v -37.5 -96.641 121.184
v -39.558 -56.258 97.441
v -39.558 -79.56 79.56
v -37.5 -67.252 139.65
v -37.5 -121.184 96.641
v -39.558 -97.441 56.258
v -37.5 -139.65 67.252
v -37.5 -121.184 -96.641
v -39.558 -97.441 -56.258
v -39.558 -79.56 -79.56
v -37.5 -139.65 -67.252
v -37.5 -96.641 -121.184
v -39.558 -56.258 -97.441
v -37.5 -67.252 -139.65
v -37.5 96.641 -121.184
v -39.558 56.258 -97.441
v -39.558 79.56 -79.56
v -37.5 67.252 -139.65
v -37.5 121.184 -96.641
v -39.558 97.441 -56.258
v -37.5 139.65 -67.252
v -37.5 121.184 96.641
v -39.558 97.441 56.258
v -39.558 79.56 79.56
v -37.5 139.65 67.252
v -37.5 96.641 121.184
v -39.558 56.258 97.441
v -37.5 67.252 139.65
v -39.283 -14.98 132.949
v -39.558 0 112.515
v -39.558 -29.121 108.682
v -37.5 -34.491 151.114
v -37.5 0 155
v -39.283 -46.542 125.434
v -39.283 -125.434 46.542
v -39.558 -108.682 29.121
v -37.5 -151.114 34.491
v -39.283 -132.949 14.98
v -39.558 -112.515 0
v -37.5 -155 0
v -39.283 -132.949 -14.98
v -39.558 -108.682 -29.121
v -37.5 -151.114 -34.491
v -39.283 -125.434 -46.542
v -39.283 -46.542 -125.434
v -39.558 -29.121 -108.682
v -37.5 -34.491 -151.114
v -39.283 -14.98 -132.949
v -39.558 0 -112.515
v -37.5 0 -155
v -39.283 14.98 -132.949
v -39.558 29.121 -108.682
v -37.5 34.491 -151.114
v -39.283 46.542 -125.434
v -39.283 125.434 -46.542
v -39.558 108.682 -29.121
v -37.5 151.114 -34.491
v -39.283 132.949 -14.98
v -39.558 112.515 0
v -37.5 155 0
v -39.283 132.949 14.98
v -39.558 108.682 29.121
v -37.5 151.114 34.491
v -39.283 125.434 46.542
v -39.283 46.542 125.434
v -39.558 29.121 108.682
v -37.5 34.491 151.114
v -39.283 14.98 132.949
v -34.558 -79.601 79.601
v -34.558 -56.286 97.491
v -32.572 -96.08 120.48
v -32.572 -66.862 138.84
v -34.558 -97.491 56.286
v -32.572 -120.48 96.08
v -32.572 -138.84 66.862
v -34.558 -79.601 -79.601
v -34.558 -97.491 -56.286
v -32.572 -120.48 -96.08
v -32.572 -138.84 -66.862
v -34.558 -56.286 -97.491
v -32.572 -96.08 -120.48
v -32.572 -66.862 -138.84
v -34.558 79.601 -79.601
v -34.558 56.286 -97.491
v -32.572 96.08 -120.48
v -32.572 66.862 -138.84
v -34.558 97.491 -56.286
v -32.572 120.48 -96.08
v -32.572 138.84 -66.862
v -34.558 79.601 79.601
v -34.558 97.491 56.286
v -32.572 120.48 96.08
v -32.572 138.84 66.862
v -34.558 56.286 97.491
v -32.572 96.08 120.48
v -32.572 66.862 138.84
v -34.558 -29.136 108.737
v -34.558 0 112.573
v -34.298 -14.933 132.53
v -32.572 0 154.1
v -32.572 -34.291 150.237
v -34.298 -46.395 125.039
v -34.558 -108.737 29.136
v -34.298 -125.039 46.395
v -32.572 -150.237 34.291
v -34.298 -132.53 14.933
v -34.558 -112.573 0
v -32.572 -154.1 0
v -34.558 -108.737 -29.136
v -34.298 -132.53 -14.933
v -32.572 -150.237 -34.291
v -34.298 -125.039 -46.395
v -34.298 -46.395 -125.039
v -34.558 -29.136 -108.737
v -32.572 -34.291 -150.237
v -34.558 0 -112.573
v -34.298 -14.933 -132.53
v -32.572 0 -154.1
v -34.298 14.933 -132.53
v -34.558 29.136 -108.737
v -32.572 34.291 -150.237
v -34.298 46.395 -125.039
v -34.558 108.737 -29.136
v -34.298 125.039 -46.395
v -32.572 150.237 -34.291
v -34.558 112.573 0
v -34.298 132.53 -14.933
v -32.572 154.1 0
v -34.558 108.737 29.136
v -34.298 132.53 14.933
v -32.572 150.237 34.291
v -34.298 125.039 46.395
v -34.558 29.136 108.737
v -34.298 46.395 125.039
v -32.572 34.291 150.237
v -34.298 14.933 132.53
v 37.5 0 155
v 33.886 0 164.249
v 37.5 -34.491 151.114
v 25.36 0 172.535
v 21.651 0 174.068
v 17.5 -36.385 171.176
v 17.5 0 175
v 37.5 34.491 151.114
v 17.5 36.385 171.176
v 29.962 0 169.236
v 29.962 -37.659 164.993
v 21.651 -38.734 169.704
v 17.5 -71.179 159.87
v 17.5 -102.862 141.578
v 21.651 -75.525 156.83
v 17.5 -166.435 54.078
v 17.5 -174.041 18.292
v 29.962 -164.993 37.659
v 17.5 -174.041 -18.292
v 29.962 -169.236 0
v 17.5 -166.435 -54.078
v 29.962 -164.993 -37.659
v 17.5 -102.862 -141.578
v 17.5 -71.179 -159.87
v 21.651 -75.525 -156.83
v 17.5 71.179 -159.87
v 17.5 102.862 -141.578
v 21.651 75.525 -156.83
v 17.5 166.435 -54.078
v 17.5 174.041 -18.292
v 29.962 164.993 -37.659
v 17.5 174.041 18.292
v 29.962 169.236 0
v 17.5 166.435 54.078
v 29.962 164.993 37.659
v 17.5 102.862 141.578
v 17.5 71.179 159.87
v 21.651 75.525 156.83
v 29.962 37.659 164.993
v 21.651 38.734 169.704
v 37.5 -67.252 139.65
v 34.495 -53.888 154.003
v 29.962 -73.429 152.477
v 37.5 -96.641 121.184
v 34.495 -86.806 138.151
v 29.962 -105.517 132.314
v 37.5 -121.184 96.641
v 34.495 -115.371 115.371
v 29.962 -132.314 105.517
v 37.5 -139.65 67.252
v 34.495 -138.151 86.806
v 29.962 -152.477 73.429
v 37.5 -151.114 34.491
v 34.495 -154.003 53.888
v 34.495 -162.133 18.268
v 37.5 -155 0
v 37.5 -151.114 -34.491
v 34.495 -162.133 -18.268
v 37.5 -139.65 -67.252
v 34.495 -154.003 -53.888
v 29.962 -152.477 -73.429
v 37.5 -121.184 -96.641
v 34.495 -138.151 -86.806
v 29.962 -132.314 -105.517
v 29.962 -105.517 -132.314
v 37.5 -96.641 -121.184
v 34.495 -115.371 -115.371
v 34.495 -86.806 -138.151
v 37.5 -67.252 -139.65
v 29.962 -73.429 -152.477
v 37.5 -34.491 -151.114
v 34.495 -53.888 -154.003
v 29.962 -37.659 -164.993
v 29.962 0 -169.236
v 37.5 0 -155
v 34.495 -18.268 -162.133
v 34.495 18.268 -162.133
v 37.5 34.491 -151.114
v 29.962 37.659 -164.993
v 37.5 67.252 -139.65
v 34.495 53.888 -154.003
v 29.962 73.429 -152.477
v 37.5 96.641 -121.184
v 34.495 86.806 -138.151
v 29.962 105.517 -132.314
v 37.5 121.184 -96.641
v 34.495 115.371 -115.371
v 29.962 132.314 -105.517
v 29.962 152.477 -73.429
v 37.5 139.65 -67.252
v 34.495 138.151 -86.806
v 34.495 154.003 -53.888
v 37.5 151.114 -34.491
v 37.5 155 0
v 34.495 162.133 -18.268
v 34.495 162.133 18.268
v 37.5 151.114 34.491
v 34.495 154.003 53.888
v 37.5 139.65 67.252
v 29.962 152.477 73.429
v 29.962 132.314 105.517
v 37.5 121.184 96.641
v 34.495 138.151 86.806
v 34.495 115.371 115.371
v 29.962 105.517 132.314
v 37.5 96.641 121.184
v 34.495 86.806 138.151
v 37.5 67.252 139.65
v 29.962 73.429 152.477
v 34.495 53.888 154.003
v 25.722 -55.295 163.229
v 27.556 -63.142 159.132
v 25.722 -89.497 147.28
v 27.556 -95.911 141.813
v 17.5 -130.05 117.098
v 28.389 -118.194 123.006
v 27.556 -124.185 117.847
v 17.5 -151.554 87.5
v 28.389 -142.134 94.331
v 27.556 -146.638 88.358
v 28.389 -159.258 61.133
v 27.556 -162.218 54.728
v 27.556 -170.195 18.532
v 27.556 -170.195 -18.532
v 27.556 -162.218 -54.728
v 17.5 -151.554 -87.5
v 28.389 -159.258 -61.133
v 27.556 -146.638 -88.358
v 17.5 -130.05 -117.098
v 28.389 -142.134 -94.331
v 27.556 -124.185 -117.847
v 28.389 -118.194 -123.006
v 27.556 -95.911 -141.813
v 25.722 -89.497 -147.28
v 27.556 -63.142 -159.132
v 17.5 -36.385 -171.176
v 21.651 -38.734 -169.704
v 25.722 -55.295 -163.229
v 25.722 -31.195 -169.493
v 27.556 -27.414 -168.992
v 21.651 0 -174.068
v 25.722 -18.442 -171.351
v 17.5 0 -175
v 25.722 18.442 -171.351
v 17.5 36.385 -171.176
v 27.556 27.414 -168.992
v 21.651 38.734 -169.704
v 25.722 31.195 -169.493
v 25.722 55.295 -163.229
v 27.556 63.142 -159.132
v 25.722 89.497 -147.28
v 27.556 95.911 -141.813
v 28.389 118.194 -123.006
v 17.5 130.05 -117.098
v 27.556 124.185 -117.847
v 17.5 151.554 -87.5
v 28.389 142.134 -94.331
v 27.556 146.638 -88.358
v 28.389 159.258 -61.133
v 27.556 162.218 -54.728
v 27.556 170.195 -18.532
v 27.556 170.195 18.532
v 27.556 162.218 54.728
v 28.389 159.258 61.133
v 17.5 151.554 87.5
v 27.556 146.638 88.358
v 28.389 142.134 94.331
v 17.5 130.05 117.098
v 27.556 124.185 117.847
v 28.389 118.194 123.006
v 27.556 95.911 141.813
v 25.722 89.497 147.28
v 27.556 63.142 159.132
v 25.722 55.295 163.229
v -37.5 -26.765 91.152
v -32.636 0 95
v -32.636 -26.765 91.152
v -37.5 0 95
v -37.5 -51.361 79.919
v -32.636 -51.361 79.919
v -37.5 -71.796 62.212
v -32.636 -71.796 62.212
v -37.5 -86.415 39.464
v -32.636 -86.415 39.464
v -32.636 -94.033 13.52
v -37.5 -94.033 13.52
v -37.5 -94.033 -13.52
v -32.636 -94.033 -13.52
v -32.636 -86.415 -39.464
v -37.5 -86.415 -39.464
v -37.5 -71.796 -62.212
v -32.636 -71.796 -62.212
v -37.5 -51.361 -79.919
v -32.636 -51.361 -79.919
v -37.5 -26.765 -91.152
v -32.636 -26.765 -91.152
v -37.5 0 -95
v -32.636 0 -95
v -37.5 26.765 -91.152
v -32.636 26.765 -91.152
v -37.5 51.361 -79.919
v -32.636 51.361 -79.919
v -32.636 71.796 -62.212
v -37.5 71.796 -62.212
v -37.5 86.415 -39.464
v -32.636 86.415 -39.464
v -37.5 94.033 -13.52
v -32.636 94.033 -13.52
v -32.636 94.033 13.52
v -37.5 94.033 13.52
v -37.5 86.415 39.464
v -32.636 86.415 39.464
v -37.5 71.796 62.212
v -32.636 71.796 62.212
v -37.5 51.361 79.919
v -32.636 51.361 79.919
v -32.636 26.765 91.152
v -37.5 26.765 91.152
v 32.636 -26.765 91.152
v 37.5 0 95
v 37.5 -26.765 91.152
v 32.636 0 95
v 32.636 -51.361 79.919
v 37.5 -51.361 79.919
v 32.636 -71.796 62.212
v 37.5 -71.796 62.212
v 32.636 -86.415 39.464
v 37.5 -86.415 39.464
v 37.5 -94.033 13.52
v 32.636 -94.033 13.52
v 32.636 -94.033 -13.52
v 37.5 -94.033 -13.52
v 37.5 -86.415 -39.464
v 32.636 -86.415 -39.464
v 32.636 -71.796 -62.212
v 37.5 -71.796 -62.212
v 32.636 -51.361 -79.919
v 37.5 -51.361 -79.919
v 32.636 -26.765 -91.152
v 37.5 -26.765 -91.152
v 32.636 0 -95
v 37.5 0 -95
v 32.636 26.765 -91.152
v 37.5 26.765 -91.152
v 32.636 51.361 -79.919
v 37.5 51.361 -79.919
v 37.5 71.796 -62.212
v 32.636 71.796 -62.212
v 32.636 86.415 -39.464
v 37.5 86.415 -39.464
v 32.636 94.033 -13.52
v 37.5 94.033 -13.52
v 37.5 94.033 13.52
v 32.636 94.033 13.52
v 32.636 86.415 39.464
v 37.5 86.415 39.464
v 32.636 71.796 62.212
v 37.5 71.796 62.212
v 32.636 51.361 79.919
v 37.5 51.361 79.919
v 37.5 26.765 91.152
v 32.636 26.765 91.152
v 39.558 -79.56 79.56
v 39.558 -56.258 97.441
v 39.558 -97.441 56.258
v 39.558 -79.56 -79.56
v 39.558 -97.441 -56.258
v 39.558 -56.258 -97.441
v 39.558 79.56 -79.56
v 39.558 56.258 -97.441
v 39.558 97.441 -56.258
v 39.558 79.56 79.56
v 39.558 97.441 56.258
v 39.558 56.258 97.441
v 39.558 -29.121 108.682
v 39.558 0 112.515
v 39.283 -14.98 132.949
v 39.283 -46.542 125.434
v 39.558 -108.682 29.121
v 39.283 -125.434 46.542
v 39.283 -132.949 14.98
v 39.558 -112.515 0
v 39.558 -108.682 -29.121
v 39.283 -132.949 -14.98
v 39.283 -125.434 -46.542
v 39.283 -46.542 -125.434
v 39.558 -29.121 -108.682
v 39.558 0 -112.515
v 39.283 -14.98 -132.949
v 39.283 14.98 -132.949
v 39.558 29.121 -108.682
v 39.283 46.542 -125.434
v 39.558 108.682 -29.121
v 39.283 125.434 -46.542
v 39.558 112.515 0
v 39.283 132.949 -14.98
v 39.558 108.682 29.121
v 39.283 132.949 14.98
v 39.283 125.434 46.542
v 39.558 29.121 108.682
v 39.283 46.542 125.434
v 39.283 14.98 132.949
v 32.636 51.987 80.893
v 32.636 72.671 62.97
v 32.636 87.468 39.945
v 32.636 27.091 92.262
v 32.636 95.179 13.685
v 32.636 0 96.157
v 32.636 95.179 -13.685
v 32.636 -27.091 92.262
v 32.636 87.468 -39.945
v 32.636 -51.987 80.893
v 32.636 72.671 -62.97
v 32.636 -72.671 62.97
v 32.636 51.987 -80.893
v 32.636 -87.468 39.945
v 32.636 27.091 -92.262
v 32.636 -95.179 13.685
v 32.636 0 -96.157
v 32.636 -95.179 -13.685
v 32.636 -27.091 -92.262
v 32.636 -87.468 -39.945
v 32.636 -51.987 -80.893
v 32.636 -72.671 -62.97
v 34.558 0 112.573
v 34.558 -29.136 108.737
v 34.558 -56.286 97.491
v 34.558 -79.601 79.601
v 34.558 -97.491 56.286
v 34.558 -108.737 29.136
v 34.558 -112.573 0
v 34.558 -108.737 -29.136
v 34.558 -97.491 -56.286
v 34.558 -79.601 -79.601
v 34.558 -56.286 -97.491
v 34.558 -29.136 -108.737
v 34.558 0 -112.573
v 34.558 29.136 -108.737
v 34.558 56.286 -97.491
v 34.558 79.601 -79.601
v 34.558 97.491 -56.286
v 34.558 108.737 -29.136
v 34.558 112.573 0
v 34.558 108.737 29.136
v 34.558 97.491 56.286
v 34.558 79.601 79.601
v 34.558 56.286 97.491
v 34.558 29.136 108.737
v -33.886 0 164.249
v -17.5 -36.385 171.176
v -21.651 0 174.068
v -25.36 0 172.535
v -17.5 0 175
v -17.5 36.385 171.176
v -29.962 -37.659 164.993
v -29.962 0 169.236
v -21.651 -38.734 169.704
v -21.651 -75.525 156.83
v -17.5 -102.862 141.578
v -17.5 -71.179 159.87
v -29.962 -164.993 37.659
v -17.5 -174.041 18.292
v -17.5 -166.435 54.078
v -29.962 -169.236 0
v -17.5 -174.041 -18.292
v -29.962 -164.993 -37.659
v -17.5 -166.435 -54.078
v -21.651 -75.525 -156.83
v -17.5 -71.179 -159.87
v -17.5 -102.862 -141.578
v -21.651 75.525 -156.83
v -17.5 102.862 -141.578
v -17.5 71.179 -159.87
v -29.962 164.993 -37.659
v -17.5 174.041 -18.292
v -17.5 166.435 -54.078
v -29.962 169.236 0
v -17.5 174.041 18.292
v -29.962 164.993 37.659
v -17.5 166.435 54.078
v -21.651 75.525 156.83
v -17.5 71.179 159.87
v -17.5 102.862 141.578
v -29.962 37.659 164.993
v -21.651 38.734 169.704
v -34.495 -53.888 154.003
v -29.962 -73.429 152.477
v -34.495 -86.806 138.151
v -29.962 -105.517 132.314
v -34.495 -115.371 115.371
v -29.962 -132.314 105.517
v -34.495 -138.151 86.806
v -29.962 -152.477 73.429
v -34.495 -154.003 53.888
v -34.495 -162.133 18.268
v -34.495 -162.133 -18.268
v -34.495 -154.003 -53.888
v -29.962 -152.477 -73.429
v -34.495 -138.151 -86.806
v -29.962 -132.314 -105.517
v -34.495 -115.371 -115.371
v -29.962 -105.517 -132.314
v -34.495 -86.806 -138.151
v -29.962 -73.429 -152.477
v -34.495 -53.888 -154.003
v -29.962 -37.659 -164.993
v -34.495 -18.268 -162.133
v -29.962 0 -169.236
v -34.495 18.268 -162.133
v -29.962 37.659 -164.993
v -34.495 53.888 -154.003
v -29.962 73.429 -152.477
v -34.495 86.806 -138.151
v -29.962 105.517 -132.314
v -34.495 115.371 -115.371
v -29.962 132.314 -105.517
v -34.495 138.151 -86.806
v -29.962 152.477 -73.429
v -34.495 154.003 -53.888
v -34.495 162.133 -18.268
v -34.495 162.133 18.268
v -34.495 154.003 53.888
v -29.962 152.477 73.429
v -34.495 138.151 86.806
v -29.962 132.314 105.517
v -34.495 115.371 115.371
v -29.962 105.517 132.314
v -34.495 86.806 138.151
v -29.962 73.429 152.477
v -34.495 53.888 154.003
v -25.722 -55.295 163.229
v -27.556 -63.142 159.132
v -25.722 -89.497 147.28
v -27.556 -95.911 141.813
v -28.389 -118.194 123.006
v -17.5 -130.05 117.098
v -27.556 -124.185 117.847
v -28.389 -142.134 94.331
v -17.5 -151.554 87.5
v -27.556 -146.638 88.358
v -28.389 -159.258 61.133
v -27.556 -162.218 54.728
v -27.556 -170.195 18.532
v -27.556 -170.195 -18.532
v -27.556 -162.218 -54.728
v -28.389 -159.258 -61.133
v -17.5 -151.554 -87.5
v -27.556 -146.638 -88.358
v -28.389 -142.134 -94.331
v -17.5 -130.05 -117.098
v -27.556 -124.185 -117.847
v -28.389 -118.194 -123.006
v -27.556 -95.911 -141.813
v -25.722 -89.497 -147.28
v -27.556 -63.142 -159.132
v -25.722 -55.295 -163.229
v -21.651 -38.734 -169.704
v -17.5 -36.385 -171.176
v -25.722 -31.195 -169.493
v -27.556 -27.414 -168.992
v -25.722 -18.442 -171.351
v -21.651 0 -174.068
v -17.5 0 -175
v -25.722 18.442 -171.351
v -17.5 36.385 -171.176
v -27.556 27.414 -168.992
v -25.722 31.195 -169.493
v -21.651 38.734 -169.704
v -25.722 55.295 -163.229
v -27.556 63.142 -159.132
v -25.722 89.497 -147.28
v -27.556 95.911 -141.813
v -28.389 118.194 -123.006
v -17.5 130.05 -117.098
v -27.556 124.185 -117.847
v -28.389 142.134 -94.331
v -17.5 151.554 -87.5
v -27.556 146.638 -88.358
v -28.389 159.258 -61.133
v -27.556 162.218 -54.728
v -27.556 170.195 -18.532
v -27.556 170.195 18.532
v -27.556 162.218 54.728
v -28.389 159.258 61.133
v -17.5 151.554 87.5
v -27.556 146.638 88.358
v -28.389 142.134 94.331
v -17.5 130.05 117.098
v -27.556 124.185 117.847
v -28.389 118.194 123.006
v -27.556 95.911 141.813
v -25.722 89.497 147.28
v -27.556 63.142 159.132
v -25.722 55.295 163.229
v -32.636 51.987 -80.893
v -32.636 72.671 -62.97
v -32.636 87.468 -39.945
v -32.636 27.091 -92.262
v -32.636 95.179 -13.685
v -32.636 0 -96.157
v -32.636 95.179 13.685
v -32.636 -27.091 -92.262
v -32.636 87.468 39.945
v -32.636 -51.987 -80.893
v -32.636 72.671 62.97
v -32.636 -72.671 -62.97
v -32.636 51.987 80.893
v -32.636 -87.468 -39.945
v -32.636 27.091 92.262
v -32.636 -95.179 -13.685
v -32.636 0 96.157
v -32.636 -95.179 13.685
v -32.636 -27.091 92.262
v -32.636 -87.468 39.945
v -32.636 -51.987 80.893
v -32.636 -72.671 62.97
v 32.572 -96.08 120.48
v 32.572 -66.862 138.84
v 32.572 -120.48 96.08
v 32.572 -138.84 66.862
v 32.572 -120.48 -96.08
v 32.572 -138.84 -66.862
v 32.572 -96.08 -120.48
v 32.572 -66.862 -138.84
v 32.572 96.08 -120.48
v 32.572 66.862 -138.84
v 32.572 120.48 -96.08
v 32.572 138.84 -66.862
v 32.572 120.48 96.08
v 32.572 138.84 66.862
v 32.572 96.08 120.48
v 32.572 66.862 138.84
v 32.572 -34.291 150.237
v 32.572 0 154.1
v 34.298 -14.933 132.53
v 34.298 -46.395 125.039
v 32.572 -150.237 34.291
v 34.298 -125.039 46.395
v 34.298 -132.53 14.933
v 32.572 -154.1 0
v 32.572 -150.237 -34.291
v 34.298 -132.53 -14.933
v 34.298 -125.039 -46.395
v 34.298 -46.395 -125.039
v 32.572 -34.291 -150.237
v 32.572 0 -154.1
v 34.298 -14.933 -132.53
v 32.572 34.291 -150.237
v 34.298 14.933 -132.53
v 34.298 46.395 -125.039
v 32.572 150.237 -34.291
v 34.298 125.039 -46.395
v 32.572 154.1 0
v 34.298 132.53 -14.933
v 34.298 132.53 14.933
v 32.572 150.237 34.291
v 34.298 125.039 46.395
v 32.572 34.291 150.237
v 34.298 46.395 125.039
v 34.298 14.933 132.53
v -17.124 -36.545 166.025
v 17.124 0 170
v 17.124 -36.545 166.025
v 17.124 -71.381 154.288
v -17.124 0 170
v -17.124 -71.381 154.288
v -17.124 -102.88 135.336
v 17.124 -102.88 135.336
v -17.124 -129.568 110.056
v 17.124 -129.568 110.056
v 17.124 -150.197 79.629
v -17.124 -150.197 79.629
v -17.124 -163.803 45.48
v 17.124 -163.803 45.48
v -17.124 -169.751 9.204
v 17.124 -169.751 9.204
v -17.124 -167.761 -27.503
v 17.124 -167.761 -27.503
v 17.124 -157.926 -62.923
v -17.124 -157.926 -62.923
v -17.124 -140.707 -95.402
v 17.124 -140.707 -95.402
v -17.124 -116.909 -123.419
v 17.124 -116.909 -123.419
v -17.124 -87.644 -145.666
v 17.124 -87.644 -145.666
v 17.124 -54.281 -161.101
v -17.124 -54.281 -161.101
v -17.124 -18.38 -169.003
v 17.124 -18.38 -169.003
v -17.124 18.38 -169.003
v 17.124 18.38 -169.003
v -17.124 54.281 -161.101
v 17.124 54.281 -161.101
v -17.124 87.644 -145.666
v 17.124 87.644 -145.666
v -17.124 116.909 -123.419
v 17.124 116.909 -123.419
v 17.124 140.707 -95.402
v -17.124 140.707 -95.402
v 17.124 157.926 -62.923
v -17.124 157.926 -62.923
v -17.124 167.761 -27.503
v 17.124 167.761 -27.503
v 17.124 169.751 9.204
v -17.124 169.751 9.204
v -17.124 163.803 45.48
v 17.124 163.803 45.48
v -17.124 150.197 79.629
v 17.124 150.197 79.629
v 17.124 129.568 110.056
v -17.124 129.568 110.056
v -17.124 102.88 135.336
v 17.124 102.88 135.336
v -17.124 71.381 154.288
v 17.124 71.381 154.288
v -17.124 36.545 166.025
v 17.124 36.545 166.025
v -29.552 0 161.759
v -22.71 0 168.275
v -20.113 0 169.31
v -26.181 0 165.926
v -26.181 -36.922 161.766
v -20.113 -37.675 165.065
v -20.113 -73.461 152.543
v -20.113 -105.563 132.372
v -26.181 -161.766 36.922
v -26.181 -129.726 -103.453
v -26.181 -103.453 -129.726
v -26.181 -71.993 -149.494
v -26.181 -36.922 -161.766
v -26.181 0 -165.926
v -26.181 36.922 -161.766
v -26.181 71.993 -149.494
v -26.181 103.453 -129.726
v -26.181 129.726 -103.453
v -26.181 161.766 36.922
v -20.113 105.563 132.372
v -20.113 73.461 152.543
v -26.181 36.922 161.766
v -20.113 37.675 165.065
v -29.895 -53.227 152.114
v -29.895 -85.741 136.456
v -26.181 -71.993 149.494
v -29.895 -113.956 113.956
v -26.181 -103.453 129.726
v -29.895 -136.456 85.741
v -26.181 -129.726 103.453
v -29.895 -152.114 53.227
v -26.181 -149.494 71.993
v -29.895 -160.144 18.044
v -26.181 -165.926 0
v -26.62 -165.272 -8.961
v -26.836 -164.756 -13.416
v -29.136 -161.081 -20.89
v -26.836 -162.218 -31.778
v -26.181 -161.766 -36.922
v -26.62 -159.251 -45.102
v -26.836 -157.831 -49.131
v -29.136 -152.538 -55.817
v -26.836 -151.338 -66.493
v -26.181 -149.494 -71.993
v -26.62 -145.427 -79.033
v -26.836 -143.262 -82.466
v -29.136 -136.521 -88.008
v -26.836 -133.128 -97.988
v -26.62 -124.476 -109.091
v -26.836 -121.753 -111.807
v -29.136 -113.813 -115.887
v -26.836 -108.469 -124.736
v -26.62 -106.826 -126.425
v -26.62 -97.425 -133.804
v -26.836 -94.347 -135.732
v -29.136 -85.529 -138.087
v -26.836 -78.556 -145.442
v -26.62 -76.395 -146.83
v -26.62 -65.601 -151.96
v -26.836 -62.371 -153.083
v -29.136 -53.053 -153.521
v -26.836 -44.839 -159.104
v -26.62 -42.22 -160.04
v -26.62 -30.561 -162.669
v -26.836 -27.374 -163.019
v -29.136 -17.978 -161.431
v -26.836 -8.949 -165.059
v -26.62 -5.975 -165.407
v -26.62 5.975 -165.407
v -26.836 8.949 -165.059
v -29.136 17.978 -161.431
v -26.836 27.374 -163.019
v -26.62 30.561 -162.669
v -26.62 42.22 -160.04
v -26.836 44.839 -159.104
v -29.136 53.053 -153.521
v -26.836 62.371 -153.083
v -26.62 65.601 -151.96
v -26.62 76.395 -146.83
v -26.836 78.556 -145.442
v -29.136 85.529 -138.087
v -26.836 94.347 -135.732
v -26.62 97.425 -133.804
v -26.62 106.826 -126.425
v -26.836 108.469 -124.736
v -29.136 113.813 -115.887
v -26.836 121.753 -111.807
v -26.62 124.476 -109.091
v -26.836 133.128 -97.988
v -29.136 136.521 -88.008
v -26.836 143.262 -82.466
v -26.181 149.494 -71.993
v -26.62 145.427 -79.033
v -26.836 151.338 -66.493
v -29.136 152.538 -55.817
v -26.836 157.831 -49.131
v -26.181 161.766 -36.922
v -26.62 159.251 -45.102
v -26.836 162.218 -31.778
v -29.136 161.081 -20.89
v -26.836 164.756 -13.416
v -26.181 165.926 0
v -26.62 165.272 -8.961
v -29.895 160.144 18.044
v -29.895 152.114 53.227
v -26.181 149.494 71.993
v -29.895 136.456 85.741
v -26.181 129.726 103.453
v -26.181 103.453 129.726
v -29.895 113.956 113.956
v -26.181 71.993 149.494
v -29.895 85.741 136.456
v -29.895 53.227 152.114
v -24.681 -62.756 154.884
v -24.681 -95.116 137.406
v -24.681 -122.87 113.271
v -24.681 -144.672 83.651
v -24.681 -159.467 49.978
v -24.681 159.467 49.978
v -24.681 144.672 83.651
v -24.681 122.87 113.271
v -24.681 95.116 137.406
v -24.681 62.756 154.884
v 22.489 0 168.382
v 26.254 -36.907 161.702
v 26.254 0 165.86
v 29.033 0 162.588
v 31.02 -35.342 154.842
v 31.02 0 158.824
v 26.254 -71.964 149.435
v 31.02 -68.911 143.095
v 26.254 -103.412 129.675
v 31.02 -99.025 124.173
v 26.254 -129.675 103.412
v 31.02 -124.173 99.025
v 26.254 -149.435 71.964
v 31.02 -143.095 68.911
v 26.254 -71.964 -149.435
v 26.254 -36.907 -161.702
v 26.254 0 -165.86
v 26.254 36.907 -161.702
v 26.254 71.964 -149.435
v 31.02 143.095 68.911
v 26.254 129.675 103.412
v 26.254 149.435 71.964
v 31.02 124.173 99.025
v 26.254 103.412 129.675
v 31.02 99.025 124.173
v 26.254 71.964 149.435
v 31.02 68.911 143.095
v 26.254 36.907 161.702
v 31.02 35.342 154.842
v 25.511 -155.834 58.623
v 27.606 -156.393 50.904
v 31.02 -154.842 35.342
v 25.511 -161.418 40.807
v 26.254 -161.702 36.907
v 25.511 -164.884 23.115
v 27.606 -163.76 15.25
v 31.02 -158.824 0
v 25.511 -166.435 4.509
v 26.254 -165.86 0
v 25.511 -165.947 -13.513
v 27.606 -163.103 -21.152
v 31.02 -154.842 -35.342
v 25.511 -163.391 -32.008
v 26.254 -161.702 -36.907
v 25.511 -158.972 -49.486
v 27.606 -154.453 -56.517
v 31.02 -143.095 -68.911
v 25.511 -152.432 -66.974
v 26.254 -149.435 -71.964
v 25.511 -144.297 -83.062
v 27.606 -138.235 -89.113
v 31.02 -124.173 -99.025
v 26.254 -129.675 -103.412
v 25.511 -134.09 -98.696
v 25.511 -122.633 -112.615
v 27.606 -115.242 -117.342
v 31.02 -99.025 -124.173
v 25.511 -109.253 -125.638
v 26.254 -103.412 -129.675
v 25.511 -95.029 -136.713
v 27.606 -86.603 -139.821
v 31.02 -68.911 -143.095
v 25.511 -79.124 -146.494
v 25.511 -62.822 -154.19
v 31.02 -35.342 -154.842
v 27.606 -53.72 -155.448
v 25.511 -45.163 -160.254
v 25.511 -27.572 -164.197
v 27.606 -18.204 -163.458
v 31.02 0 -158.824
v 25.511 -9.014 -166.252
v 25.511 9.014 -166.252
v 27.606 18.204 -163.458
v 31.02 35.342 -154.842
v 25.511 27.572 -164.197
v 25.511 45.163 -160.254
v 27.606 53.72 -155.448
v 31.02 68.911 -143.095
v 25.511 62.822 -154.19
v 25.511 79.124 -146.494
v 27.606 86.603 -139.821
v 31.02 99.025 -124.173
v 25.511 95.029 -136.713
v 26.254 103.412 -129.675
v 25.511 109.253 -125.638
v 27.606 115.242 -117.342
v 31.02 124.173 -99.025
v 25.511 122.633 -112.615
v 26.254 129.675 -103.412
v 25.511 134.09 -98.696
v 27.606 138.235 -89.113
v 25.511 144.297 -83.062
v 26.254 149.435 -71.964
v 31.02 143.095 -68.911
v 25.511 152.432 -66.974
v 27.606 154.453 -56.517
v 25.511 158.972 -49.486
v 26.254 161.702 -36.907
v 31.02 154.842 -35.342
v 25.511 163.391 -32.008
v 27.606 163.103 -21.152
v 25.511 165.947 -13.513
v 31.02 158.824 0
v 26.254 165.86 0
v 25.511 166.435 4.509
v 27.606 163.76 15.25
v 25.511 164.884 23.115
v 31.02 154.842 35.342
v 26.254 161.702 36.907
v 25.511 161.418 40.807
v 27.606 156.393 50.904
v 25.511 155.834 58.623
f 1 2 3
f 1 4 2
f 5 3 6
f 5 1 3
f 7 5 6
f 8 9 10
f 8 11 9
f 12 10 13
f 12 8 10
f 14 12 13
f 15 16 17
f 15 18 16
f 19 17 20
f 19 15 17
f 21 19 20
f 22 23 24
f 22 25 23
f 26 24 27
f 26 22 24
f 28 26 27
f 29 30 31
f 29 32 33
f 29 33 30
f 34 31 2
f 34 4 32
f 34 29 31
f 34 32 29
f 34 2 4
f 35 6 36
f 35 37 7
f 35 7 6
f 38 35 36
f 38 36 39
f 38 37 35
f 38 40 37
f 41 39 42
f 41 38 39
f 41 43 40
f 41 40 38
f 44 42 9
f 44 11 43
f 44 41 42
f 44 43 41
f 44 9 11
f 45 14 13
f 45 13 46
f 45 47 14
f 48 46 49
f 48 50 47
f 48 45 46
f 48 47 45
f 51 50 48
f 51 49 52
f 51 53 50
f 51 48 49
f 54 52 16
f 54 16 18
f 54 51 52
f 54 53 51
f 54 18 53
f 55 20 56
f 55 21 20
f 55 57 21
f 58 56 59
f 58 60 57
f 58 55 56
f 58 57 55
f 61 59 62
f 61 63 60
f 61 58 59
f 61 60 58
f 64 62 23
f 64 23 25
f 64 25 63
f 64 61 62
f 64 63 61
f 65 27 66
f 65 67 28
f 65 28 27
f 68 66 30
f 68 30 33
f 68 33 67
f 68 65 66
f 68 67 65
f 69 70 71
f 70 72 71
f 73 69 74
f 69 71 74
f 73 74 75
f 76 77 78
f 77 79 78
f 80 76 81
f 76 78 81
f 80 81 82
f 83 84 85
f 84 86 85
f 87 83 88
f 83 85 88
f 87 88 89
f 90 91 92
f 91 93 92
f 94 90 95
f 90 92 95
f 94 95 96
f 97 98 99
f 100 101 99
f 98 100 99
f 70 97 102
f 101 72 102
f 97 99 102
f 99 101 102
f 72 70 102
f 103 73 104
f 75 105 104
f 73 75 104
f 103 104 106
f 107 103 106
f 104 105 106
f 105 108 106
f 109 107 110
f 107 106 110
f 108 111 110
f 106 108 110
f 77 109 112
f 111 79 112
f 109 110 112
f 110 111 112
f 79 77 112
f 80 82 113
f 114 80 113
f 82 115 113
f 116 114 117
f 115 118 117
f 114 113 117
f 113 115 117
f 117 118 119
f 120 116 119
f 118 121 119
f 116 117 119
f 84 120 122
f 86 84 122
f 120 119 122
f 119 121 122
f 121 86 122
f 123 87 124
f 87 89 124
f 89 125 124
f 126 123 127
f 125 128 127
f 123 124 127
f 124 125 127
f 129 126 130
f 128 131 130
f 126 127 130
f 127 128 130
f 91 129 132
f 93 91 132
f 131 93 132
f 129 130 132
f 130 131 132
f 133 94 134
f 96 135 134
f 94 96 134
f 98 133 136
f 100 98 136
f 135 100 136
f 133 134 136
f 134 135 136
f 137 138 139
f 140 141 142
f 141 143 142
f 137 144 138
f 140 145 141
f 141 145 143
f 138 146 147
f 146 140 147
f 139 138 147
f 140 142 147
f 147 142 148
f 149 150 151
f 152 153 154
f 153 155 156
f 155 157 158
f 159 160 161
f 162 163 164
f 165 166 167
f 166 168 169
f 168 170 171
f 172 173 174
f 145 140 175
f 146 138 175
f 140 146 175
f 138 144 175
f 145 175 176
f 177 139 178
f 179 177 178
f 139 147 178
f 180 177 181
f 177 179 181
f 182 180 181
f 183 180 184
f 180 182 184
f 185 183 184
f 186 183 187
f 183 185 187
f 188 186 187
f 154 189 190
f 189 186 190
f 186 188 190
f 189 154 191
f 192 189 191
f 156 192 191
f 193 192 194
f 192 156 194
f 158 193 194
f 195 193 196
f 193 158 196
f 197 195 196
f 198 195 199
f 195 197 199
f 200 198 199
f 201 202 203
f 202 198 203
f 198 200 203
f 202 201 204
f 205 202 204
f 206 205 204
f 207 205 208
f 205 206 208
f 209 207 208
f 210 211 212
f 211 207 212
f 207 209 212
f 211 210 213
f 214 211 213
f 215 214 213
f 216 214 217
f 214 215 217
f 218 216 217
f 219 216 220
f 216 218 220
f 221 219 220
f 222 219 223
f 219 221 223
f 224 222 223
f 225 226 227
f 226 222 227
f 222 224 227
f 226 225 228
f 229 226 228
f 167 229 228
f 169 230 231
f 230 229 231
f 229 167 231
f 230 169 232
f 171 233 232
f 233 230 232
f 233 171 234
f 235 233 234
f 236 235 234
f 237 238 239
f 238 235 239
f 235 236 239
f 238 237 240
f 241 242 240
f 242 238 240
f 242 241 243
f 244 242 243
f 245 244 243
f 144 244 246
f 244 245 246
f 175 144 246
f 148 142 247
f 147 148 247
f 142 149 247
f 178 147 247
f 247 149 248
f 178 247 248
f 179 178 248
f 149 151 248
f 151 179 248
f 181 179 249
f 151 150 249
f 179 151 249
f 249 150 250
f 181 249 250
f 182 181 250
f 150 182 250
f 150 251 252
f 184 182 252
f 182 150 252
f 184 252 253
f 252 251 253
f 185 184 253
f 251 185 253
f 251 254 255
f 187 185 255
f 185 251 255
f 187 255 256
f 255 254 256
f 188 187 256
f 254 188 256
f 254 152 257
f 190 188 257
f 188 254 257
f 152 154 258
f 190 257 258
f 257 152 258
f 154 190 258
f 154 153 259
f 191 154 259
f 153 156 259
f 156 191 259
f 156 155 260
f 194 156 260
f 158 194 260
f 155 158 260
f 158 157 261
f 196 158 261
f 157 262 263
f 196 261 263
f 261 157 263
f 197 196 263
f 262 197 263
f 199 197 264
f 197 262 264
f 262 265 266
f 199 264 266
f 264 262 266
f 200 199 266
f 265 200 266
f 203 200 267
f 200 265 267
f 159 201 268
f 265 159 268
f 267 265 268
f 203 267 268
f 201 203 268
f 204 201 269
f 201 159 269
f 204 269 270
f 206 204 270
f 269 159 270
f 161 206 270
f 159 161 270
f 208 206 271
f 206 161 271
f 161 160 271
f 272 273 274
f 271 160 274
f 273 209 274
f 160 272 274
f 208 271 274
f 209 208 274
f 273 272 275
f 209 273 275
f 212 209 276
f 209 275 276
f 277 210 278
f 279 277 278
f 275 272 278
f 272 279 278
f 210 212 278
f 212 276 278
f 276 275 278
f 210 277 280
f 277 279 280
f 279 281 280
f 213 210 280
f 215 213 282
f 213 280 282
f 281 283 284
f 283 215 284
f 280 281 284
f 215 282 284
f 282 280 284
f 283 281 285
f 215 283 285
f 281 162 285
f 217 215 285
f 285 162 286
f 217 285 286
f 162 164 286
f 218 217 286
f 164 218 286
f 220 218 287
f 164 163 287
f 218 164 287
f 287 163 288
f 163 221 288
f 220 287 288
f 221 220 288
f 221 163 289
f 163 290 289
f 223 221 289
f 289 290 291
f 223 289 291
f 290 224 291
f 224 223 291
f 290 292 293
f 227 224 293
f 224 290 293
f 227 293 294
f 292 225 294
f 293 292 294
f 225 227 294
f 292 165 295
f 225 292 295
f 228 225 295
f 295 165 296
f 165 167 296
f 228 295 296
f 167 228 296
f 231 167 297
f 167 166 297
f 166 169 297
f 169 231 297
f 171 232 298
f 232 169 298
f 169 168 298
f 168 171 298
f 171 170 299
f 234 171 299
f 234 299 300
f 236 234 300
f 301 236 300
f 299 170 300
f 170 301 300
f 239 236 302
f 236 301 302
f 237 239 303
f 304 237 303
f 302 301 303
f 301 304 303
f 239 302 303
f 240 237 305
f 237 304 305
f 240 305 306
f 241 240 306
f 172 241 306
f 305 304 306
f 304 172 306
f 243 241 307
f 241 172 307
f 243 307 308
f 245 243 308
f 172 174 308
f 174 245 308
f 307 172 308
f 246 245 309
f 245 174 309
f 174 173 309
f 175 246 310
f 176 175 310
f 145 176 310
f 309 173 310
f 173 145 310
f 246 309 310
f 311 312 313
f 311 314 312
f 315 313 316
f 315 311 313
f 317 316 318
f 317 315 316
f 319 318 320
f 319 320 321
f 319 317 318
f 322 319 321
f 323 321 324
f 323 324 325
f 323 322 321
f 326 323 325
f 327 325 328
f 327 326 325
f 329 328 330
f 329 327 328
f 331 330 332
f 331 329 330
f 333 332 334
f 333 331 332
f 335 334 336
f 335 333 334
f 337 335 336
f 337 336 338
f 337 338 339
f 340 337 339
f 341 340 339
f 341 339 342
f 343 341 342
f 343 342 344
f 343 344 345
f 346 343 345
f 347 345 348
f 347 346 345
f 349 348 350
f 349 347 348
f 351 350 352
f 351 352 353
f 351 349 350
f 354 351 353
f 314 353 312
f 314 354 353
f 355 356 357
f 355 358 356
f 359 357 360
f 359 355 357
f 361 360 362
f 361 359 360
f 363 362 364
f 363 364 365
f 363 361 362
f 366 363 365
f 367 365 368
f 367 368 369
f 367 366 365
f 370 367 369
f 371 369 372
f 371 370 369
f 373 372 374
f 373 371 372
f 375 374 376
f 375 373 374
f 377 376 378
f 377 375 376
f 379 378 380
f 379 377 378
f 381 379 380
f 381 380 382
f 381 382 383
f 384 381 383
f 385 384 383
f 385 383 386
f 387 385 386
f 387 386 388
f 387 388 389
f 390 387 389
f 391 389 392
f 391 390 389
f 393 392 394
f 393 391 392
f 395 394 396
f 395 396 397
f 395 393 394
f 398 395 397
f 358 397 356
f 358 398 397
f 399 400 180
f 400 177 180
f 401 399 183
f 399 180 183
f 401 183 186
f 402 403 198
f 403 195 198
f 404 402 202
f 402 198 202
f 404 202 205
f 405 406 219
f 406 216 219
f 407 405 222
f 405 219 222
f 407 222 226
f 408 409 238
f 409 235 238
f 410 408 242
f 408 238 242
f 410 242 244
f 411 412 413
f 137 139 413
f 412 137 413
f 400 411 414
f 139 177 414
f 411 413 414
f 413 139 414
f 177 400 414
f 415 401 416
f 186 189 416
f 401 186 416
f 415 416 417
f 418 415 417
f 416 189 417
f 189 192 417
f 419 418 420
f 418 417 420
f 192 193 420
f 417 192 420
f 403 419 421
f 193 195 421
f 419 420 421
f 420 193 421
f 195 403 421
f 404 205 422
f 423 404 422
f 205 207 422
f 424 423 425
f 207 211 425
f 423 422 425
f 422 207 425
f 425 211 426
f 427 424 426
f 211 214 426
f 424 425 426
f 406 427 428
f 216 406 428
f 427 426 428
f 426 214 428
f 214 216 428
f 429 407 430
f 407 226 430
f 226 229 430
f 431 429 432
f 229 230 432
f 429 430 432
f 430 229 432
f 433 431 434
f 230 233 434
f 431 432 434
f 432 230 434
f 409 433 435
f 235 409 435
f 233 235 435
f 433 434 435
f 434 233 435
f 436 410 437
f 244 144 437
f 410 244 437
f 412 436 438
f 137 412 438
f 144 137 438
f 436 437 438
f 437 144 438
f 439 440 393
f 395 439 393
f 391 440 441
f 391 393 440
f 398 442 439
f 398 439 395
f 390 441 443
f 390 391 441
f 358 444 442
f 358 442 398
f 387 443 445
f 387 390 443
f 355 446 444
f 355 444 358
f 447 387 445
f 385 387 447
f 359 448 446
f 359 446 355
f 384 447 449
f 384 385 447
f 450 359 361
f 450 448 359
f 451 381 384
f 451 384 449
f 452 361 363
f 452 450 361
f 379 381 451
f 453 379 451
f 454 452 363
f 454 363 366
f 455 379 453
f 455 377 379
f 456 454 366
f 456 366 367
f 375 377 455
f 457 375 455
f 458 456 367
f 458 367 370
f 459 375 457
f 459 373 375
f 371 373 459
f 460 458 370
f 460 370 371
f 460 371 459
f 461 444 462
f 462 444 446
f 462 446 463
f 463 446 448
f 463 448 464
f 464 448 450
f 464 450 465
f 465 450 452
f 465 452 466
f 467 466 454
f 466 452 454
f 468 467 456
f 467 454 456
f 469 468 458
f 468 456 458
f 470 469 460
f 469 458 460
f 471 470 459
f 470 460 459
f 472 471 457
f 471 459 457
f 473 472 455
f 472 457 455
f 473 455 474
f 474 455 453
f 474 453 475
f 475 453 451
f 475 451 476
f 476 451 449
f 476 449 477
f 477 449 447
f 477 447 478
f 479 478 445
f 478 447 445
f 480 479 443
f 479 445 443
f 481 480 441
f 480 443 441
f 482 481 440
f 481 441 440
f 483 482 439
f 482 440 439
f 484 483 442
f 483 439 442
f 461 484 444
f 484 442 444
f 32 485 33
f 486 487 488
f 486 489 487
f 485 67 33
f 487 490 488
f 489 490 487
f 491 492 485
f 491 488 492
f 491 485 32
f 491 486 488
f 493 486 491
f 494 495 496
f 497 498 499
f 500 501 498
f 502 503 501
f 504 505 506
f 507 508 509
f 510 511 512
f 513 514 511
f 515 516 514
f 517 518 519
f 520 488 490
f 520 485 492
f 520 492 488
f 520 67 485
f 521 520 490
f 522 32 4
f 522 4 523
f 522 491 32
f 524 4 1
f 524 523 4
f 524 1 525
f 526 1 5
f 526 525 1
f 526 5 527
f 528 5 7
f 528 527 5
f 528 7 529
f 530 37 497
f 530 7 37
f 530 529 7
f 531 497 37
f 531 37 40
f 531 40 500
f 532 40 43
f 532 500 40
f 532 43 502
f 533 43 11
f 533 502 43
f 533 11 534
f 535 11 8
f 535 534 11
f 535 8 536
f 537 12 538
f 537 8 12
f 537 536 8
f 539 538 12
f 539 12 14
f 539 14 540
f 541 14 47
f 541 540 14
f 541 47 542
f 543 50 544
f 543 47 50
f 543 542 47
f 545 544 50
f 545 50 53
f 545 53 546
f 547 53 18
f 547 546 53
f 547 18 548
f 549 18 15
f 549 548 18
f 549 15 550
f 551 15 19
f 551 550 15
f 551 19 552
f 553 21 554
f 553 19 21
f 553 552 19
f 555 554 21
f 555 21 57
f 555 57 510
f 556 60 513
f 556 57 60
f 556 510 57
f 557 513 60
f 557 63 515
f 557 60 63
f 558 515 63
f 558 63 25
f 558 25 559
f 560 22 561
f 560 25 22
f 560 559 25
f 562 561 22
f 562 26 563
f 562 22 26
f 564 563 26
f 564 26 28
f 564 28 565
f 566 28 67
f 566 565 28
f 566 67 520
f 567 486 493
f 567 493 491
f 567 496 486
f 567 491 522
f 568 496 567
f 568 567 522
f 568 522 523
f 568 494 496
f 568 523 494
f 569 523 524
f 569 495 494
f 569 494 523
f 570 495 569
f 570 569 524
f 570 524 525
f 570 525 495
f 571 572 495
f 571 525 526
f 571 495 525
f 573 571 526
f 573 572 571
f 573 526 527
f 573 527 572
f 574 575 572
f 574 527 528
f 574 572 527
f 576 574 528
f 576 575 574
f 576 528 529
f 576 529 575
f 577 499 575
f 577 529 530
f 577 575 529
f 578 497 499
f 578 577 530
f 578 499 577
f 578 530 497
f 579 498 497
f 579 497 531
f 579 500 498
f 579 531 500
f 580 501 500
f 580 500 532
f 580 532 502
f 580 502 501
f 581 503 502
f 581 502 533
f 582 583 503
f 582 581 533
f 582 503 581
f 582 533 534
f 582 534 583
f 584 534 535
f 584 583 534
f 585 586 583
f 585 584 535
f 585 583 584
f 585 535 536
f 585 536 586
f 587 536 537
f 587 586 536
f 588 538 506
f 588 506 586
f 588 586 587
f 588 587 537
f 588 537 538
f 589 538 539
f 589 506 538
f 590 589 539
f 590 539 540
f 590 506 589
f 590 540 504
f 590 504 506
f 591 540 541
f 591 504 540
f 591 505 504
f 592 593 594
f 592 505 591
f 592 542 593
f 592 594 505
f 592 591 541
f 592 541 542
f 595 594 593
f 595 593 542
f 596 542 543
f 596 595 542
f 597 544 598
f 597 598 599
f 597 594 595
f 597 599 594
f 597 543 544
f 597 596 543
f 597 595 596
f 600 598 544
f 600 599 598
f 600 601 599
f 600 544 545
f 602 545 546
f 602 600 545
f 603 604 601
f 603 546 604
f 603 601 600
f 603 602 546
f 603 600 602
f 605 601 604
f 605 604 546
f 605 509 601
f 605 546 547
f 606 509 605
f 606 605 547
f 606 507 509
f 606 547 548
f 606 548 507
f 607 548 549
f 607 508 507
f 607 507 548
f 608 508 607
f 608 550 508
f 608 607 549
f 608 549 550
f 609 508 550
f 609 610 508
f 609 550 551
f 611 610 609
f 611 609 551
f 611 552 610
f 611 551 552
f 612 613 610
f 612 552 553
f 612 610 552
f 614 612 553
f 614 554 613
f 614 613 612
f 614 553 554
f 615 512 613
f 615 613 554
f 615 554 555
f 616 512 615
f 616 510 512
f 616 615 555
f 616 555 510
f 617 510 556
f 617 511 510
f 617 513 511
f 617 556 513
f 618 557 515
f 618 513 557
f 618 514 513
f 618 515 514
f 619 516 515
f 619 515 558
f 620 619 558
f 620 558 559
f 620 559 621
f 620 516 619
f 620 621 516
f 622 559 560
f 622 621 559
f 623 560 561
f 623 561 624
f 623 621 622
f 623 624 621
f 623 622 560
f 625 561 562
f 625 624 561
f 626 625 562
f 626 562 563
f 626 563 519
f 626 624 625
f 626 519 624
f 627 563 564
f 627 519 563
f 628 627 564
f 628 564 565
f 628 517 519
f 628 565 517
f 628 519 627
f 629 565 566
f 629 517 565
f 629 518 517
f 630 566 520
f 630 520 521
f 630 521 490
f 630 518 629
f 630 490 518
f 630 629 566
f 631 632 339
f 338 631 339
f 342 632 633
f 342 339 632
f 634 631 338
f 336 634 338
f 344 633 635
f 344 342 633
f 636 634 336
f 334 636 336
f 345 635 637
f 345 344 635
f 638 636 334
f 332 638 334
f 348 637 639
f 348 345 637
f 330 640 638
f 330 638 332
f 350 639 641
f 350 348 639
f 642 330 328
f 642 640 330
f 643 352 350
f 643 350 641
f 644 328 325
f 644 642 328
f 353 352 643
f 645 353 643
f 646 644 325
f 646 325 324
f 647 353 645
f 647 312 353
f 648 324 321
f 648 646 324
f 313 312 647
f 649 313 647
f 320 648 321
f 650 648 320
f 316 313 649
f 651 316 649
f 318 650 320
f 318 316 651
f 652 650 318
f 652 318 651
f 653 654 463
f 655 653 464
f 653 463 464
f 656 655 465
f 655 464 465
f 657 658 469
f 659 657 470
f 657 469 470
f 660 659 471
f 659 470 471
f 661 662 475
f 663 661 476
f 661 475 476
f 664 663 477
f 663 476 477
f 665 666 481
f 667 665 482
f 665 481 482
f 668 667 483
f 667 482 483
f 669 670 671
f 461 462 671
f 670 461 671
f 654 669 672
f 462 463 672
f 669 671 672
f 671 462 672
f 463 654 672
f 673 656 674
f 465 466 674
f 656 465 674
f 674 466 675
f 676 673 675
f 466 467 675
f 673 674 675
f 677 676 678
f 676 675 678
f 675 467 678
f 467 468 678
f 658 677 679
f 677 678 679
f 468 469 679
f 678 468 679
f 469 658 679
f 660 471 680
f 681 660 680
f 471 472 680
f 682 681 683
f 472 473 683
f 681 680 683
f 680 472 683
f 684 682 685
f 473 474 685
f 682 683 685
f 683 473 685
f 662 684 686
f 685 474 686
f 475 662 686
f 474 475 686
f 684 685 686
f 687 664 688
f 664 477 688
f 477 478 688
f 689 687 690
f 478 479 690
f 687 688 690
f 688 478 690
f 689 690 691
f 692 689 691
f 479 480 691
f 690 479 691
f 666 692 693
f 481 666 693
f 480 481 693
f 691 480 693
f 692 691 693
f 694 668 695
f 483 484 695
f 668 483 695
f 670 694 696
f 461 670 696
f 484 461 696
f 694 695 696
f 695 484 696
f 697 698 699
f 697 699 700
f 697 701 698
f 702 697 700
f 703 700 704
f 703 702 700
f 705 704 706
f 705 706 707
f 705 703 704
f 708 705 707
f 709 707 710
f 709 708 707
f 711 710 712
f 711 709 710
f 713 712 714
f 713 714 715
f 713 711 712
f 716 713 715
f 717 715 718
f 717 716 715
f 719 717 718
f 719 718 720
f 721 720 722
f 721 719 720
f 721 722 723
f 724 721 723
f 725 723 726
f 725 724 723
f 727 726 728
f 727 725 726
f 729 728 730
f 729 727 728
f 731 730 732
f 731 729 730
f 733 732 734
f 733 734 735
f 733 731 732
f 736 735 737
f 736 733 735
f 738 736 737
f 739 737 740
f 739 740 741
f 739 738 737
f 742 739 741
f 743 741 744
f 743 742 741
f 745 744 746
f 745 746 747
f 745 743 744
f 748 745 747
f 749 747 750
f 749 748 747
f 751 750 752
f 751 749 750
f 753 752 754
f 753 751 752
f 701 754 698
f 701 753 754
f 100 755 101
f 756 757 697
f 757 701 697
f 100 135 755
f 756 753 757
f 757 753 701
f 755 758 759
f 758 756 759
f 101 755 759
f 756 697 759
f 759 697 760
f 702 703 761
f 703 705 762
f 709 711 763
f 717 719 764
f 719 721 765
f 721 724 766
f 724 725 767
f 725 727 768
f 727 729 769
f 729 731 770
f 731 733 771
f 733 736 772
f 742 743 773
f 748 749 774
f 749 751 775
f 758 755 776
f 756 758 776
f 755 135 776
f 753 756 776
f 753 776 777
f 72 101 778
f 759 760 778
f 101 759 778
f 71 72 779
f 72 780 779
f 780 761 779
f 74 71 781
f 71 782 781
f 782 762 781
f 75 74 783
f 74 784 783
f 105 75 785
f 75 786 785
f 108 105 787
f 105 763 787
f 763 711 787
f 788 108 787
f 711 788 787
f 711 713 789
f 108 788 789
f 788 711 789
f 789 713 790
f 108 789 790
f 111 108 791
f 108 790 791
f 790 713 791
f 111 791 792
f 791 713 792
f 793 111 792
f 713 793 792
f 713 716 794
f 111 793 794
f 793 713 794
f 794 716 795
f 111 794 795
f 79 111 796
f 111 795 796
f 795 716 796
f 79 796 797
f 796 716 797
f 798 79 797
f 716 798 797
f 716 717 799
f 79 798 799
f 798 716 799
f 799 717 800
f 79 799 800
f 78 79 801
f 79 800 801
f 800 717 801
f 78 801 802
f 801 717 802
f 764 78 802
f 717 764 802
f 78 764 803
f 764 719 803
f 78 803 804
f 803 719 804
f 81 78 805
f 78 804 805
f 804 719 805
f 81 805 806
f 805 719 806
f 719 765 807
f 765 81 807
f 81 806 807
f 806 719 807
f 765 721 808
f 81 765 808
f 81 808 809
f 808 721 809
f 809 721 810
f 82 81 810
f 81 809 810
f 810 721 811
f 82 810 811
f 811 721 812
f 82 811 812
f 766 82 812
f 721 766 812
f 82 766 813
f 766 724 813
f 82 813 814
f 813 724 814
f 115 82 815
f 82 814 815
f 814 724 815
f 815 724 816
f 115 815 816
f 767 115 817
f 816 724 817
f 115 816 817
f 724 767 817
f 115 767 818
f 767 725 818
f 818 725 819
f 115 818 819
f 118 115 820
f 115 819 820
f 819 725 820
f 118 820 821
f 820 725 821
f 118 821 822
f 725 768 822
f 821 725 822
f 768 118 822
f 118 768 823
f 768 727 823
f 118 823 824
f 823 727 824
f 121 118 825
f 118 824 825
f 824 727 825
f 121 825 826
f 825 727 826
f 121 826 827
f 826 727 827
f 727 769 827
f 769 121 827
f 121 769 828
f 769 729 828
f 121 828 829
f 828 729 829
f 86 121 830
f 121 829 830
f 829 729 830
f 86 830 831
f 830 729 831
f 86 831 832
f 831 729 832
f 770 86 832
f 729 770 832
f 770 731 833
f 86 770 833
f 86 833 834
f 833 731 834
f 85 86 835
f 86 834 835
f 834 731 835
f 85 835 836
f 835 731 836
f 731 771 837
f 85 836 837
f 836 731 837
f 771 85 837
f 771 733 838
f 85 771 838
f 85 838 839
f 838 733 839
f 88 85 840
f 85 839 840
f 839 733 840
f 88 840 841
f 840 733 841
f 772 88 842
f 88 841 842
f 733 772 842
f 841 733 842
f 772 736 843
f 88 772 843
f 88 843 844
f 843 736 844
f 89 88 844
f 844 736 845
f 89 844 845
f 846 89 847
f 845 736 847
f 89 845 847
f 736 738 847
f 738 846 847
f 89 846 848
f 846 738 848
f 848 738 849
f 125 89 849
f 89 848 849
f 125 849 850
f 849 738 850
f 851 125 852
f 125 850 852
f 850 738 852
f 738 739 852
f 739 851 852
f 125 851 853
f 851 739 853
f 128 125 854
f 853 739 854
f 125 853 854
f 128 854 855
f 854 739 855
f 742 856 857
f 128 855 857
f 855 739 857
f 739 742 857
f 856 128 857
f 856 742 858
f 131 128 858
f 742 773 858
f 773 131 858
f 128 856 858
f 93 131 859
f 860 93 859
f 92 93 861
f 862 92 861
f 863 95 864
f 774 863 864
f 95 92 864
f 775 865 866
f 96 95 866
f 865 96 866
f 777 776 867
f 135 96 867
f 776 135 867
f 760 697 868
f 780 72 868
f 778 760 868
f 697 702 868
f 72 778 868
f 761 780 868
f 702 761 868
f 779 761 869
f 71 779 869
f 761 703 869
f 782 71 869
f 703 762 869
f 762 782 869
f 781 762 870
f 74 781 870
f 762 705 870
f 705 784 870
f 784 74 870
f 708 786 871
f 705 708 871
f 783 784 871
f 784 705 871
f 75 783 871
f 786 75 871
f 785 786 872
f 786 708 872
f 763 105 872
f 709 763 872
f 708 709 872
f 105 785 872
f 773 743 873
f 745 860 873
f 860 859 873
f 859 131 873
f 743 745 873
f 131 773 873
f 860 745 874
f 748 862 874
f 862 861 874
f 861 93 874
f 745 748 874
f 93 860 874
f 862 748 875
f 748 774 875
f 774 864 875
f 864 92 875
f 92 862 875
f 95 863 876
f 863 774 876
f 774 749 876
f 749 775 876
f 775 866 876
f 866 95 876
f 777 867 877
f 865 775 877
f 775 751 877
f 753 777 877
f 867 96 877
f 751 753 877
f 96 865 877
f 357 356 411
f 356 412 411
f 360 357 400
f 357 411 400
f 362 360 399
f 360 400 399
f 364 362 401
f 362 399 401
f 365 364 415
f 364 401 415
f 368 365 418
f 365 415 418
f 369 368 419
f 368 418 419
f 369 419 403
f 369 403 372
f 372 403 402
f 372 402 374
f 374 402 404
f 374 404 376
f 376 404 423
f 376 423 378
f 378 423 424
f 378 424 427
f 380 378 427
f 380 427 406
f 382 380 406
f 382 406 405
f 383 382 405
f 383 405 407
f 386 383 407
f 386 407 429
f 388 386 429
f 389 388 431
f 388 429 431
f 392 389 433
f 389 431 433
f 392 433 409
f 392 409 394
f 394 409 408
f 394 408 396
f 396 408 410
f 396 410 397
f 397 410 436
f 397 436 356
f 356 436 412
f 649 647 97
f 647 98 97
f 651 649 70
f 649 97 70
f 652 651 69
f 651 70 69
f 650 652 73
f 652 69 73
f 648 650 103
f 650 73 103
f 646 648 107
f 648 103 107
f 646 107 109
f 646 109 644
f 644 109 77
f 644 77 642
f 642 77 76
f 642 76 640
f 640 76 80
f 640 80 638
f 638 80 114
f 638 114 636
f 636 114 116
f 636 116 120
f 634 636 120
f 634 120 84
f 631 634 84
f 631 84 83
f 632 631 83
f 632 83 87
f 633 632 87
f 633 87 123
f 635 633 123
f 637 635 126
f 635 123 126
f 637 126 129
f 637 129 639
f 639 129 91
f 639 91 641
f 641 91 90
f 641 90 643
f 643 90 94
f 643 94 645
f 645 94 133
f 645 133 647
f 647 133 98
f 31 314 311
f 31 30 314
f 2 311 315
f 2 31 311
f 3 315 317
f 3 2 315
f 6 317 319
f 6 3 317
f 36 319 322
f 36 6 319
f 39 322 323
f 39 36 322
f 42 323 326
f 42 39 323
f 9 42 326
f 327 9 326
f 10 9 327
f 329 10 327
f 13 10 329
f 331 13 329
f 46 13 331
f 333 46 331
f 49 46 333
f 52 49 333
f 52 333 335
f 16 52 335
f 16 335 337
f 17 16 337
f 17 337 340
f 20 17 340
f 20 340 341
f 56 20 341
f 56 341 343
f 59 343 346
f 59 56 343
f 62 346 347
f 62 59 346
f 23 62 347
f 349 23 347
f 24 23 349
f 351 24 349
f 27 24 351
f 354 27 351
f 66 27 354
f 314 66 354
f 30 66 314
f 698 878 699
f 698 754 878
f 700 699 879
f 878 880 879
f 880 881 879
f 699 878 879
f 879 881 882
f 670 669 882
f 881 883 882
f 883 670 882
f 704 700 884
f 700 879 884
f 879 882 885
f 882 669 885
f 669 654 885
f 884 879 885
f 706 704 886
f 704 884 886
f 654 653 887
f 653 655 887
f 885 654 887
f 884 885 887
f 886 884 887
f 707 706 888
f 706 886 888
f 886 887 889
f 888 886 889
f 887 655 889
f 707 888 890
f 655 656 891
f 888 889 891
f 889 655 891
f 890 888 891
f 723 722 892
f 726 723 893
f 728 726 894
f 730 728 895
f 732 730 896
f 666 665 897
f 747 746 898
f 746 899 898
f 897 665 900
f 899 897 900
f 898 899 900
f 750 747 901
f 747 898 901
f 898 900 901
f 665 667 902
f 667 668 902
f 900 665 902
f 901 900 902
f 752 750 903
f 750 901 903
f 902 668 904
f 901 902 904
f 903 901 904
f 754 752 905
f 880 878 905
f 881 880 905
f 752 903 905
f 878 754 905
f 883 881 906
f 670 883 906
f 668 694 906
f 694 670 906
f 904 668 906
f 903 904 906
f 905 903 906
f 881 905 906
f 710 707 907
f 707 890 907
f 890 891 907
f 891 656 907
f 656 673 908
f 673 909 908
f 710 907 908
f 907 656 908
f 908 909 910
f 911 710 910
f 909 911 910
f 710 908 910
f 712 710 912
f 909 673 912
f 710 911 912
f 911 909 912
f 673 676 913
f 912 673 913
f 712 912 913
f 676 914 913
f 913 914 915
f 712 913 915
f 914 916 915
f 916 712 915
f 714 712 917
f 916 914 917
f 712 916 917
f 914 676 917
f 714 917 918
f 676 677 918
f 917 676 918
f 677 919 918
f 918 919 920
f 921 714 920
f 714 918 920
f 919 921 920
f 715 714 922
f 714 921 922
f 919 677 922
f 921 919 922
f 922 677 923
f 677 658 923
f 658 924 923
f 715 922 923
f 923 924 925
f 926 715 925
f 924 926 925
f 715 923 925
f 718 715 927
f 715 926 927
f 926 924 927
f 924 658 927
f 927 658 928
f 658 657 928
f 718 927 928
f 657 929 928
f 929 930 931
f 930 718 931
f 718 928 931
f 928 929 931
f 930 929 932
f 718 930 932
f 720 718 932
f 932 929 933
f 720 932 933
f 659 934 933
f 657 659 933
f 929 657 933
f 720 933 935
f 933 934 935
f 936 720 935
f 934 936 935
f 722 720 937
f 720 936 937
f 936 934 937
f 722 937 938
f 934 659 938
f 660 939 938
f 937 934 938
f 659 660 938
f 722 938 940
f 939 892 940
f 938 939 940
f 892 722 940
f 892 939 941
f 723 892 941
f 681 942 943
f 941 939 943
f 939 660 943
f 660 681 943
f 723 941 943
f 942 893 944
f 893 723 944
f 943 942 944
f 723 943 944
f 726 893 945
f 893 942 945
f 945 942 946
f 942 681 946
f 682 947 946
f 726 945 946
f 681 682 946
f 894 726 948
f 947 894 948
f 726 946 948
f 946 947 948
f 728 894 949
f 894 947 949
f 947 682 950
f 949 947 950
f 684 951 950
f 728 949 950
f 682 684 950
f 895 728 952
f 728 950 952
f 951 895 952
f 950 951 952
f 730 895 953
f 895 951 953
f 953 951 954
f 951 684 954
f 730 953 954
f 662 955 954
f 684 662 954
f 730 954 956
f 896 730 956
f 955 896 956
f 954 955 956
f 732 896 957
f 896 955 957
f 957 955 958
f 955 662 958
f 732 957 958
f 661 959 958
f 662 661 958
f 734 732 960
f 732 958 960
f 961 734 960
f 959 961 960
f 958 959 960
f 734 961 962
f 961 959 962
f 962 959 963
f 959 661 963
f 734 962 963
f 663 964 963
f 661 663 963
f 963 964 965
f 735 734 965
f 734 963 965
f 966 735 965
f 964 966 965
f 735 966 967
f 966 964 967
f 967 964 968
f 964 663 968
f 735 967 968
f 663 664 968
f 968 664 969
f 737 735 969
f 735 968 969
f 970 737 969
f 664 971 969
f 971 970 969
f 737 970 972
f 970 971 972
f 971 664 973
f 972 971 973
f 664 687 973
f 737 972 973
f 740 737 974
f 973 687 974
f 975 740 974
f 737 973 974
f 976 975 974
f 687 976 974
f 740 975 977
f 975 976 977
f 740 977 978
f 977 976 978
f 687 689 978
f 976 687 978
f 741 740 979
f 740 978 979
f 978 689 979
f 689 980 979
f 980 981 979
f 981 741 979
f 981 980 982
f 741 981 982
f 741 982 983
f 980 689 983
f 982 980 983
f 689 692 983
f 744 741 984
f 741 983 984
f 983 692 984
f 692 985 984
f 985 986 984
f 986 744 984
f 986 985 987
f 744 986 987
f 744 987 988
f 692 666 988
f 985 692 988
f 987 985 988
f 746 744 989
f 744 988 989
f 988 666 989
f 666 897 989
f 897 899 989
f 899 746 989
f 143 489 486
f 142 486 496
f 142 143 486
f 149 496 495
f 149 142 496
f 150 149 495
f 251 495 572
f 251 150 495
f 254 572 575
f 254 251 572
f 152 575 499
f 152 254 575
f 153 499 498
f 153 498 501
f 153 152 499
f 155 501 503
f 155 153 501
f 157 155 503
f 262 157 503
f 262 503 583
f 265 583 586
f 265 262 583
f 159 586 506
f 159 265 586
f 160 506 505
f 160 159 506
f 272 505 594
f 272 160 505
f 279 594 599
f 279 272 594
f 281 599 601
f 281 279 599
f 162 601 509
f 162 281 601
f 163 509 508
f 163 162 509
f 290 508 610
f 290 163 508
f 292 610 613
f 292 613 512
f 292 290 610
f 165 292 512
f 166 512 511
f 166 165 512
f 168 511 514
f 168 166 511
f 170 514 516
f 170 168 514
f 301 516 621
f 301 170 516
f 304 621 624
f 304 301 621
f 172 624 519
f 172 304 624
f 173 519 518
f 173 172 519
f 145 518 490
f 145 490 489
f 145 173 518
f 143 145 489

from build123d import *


with BuildPart() as part:
    # Çizim2 → Döndür2 (revolve)
    with BuildSketch(Plane.XY, mode=Mode.PRIVATE) as d_nd_r2_sk:
        with BuildLine():
            Line((-17.5, 175), (17.5, 175))
            add(Edge.make_bspline(
                [(37.5, 155), (33.180831077, 172.735676283), (17.5, 175)],
                knots=[0, 0, 0, 1, 1, 1], degree=2))
            add(Edge.make_bspline(
                [(39.558004611, 112.515379933), (40.037526358, 133.823558291), (37.5, 155)],
                knots=[0, 0, 0, 1, 1, 1], degree=2))
            add(Edge.make_bspline(
                [(37.5, 95), (39.553838697, 103.632489558), (39.558004611, 112.515379933)],
                knots=[0, 0, 0, 1, 1, 1], degree=2))
            Line((37.5, 95), (32.635776521, 95))
            Line((32.635776521, 95), (32.635776521, 96.157294236))
            add(Edge.make_bspline(
                [(34.558030993, 112.572805408), (34.560206153, 104.242772286), (32.635776521, 96.157294236)],
                knots=[0, 0, 0, 1.003100374, 1.003100374, 1.003100374], degree=2))
            add(Edge.make_bspline(
                [(32.571883188, 154.100277592), (35.030598816, 133.401140869), (34.558030993, 112.572805408)],
                knots=[-0.001292148, -0.001292148, -0.001292148, 0.992681429, 0.992681429, 0.992681429], degree=2))
            add(Edge.make_bspline(
                [(17.124055566, 170), (19.474259763, 169.620198998), (23.300690577, 168.10451916), (26.942501614, 165.499652433), (29.8373746, 161.506356907), (31.847105471, 156.962883589), (32.571883188, 154.100277592)],
                knots=[0.00902413, 0.00902413, 0.00902413, 0.192379486, 0.375734842, 0.620208649, 0.803564005, 0.986919361, 0.986919361, 0.986919361], degree=2))
            Line((17.124055566, 170), (-17.124055566, 170))
            add(Edge.make_bspline(
                [(-32.571883188, 154.100277592), (-31.847105471, 156.962883589), (-29.8373746, 161.506356907), (-26.942501614, 165.499652433), (-23.300690577, 168.10451916), (-19.474259763, 169.620198998), (-17.124055566, 170)],
                knots=[0.00902413, 0.00902413, 0.00902413, 0.192379486, 0.375734842, 0.620208649, 0.803564005, 0.986919361, 0.986919361, 0.986919361], degree=2))
            add(Edge.make_bspline(
                [(-34.558030993, 112.572805408), (-35.030598816, 133.401140869), (-32.571883188, 154.100277592)],
                knots=[-0.001292148, -0.001292148, -0.001292148, 0.992681429, 0.992681429, 0.992681429], degree=2))
            add(Edge.make_bspline(
                [(-32.635776521, 96.157294236), (-34.560206153, 104.242772286), (-34.558030993, 112.572805408)],
                knots=[0, 0, 0, 1.003100374, 1.003100374, 1.003100374], degree=2))
            Line((-32.635776521, 96.157294236), (-32.635776521, 95))
            Line((-32.635776521, 95), (-37.5, 95))
            add(Edge.make_bspline(
                [(-37.5, 95), (-39.553838697, 103.632489558), (-39.558004611, 112.515379933)],
                knots=[0, 0, 0, 1, 1, 1], degree=2))
            add(Edge.make_bspline(
                [(-39.558004611, 112.515379933), (-40.037526358, 133.823558291), (-37.5, 155)],
                knots=[0, 0, 0, 1, 1, 1], degree=2))
            add(Edge.make_bspline(
                [(-37.5, 155), (-33.180831077, 172.735676283), (-17.5, 175)],
                knots=[0, 0, 0, 1, 1, 1], degree=2))
        make_face()
    revolve(d_nd_r2_sk.sketch.rotate(Axis((-171.693896407, 0, 0), (1, 0, 0)), 90), axis=Axis((-171.693896407, 0, 0), (1, 0, 0)))


solid = part.part
